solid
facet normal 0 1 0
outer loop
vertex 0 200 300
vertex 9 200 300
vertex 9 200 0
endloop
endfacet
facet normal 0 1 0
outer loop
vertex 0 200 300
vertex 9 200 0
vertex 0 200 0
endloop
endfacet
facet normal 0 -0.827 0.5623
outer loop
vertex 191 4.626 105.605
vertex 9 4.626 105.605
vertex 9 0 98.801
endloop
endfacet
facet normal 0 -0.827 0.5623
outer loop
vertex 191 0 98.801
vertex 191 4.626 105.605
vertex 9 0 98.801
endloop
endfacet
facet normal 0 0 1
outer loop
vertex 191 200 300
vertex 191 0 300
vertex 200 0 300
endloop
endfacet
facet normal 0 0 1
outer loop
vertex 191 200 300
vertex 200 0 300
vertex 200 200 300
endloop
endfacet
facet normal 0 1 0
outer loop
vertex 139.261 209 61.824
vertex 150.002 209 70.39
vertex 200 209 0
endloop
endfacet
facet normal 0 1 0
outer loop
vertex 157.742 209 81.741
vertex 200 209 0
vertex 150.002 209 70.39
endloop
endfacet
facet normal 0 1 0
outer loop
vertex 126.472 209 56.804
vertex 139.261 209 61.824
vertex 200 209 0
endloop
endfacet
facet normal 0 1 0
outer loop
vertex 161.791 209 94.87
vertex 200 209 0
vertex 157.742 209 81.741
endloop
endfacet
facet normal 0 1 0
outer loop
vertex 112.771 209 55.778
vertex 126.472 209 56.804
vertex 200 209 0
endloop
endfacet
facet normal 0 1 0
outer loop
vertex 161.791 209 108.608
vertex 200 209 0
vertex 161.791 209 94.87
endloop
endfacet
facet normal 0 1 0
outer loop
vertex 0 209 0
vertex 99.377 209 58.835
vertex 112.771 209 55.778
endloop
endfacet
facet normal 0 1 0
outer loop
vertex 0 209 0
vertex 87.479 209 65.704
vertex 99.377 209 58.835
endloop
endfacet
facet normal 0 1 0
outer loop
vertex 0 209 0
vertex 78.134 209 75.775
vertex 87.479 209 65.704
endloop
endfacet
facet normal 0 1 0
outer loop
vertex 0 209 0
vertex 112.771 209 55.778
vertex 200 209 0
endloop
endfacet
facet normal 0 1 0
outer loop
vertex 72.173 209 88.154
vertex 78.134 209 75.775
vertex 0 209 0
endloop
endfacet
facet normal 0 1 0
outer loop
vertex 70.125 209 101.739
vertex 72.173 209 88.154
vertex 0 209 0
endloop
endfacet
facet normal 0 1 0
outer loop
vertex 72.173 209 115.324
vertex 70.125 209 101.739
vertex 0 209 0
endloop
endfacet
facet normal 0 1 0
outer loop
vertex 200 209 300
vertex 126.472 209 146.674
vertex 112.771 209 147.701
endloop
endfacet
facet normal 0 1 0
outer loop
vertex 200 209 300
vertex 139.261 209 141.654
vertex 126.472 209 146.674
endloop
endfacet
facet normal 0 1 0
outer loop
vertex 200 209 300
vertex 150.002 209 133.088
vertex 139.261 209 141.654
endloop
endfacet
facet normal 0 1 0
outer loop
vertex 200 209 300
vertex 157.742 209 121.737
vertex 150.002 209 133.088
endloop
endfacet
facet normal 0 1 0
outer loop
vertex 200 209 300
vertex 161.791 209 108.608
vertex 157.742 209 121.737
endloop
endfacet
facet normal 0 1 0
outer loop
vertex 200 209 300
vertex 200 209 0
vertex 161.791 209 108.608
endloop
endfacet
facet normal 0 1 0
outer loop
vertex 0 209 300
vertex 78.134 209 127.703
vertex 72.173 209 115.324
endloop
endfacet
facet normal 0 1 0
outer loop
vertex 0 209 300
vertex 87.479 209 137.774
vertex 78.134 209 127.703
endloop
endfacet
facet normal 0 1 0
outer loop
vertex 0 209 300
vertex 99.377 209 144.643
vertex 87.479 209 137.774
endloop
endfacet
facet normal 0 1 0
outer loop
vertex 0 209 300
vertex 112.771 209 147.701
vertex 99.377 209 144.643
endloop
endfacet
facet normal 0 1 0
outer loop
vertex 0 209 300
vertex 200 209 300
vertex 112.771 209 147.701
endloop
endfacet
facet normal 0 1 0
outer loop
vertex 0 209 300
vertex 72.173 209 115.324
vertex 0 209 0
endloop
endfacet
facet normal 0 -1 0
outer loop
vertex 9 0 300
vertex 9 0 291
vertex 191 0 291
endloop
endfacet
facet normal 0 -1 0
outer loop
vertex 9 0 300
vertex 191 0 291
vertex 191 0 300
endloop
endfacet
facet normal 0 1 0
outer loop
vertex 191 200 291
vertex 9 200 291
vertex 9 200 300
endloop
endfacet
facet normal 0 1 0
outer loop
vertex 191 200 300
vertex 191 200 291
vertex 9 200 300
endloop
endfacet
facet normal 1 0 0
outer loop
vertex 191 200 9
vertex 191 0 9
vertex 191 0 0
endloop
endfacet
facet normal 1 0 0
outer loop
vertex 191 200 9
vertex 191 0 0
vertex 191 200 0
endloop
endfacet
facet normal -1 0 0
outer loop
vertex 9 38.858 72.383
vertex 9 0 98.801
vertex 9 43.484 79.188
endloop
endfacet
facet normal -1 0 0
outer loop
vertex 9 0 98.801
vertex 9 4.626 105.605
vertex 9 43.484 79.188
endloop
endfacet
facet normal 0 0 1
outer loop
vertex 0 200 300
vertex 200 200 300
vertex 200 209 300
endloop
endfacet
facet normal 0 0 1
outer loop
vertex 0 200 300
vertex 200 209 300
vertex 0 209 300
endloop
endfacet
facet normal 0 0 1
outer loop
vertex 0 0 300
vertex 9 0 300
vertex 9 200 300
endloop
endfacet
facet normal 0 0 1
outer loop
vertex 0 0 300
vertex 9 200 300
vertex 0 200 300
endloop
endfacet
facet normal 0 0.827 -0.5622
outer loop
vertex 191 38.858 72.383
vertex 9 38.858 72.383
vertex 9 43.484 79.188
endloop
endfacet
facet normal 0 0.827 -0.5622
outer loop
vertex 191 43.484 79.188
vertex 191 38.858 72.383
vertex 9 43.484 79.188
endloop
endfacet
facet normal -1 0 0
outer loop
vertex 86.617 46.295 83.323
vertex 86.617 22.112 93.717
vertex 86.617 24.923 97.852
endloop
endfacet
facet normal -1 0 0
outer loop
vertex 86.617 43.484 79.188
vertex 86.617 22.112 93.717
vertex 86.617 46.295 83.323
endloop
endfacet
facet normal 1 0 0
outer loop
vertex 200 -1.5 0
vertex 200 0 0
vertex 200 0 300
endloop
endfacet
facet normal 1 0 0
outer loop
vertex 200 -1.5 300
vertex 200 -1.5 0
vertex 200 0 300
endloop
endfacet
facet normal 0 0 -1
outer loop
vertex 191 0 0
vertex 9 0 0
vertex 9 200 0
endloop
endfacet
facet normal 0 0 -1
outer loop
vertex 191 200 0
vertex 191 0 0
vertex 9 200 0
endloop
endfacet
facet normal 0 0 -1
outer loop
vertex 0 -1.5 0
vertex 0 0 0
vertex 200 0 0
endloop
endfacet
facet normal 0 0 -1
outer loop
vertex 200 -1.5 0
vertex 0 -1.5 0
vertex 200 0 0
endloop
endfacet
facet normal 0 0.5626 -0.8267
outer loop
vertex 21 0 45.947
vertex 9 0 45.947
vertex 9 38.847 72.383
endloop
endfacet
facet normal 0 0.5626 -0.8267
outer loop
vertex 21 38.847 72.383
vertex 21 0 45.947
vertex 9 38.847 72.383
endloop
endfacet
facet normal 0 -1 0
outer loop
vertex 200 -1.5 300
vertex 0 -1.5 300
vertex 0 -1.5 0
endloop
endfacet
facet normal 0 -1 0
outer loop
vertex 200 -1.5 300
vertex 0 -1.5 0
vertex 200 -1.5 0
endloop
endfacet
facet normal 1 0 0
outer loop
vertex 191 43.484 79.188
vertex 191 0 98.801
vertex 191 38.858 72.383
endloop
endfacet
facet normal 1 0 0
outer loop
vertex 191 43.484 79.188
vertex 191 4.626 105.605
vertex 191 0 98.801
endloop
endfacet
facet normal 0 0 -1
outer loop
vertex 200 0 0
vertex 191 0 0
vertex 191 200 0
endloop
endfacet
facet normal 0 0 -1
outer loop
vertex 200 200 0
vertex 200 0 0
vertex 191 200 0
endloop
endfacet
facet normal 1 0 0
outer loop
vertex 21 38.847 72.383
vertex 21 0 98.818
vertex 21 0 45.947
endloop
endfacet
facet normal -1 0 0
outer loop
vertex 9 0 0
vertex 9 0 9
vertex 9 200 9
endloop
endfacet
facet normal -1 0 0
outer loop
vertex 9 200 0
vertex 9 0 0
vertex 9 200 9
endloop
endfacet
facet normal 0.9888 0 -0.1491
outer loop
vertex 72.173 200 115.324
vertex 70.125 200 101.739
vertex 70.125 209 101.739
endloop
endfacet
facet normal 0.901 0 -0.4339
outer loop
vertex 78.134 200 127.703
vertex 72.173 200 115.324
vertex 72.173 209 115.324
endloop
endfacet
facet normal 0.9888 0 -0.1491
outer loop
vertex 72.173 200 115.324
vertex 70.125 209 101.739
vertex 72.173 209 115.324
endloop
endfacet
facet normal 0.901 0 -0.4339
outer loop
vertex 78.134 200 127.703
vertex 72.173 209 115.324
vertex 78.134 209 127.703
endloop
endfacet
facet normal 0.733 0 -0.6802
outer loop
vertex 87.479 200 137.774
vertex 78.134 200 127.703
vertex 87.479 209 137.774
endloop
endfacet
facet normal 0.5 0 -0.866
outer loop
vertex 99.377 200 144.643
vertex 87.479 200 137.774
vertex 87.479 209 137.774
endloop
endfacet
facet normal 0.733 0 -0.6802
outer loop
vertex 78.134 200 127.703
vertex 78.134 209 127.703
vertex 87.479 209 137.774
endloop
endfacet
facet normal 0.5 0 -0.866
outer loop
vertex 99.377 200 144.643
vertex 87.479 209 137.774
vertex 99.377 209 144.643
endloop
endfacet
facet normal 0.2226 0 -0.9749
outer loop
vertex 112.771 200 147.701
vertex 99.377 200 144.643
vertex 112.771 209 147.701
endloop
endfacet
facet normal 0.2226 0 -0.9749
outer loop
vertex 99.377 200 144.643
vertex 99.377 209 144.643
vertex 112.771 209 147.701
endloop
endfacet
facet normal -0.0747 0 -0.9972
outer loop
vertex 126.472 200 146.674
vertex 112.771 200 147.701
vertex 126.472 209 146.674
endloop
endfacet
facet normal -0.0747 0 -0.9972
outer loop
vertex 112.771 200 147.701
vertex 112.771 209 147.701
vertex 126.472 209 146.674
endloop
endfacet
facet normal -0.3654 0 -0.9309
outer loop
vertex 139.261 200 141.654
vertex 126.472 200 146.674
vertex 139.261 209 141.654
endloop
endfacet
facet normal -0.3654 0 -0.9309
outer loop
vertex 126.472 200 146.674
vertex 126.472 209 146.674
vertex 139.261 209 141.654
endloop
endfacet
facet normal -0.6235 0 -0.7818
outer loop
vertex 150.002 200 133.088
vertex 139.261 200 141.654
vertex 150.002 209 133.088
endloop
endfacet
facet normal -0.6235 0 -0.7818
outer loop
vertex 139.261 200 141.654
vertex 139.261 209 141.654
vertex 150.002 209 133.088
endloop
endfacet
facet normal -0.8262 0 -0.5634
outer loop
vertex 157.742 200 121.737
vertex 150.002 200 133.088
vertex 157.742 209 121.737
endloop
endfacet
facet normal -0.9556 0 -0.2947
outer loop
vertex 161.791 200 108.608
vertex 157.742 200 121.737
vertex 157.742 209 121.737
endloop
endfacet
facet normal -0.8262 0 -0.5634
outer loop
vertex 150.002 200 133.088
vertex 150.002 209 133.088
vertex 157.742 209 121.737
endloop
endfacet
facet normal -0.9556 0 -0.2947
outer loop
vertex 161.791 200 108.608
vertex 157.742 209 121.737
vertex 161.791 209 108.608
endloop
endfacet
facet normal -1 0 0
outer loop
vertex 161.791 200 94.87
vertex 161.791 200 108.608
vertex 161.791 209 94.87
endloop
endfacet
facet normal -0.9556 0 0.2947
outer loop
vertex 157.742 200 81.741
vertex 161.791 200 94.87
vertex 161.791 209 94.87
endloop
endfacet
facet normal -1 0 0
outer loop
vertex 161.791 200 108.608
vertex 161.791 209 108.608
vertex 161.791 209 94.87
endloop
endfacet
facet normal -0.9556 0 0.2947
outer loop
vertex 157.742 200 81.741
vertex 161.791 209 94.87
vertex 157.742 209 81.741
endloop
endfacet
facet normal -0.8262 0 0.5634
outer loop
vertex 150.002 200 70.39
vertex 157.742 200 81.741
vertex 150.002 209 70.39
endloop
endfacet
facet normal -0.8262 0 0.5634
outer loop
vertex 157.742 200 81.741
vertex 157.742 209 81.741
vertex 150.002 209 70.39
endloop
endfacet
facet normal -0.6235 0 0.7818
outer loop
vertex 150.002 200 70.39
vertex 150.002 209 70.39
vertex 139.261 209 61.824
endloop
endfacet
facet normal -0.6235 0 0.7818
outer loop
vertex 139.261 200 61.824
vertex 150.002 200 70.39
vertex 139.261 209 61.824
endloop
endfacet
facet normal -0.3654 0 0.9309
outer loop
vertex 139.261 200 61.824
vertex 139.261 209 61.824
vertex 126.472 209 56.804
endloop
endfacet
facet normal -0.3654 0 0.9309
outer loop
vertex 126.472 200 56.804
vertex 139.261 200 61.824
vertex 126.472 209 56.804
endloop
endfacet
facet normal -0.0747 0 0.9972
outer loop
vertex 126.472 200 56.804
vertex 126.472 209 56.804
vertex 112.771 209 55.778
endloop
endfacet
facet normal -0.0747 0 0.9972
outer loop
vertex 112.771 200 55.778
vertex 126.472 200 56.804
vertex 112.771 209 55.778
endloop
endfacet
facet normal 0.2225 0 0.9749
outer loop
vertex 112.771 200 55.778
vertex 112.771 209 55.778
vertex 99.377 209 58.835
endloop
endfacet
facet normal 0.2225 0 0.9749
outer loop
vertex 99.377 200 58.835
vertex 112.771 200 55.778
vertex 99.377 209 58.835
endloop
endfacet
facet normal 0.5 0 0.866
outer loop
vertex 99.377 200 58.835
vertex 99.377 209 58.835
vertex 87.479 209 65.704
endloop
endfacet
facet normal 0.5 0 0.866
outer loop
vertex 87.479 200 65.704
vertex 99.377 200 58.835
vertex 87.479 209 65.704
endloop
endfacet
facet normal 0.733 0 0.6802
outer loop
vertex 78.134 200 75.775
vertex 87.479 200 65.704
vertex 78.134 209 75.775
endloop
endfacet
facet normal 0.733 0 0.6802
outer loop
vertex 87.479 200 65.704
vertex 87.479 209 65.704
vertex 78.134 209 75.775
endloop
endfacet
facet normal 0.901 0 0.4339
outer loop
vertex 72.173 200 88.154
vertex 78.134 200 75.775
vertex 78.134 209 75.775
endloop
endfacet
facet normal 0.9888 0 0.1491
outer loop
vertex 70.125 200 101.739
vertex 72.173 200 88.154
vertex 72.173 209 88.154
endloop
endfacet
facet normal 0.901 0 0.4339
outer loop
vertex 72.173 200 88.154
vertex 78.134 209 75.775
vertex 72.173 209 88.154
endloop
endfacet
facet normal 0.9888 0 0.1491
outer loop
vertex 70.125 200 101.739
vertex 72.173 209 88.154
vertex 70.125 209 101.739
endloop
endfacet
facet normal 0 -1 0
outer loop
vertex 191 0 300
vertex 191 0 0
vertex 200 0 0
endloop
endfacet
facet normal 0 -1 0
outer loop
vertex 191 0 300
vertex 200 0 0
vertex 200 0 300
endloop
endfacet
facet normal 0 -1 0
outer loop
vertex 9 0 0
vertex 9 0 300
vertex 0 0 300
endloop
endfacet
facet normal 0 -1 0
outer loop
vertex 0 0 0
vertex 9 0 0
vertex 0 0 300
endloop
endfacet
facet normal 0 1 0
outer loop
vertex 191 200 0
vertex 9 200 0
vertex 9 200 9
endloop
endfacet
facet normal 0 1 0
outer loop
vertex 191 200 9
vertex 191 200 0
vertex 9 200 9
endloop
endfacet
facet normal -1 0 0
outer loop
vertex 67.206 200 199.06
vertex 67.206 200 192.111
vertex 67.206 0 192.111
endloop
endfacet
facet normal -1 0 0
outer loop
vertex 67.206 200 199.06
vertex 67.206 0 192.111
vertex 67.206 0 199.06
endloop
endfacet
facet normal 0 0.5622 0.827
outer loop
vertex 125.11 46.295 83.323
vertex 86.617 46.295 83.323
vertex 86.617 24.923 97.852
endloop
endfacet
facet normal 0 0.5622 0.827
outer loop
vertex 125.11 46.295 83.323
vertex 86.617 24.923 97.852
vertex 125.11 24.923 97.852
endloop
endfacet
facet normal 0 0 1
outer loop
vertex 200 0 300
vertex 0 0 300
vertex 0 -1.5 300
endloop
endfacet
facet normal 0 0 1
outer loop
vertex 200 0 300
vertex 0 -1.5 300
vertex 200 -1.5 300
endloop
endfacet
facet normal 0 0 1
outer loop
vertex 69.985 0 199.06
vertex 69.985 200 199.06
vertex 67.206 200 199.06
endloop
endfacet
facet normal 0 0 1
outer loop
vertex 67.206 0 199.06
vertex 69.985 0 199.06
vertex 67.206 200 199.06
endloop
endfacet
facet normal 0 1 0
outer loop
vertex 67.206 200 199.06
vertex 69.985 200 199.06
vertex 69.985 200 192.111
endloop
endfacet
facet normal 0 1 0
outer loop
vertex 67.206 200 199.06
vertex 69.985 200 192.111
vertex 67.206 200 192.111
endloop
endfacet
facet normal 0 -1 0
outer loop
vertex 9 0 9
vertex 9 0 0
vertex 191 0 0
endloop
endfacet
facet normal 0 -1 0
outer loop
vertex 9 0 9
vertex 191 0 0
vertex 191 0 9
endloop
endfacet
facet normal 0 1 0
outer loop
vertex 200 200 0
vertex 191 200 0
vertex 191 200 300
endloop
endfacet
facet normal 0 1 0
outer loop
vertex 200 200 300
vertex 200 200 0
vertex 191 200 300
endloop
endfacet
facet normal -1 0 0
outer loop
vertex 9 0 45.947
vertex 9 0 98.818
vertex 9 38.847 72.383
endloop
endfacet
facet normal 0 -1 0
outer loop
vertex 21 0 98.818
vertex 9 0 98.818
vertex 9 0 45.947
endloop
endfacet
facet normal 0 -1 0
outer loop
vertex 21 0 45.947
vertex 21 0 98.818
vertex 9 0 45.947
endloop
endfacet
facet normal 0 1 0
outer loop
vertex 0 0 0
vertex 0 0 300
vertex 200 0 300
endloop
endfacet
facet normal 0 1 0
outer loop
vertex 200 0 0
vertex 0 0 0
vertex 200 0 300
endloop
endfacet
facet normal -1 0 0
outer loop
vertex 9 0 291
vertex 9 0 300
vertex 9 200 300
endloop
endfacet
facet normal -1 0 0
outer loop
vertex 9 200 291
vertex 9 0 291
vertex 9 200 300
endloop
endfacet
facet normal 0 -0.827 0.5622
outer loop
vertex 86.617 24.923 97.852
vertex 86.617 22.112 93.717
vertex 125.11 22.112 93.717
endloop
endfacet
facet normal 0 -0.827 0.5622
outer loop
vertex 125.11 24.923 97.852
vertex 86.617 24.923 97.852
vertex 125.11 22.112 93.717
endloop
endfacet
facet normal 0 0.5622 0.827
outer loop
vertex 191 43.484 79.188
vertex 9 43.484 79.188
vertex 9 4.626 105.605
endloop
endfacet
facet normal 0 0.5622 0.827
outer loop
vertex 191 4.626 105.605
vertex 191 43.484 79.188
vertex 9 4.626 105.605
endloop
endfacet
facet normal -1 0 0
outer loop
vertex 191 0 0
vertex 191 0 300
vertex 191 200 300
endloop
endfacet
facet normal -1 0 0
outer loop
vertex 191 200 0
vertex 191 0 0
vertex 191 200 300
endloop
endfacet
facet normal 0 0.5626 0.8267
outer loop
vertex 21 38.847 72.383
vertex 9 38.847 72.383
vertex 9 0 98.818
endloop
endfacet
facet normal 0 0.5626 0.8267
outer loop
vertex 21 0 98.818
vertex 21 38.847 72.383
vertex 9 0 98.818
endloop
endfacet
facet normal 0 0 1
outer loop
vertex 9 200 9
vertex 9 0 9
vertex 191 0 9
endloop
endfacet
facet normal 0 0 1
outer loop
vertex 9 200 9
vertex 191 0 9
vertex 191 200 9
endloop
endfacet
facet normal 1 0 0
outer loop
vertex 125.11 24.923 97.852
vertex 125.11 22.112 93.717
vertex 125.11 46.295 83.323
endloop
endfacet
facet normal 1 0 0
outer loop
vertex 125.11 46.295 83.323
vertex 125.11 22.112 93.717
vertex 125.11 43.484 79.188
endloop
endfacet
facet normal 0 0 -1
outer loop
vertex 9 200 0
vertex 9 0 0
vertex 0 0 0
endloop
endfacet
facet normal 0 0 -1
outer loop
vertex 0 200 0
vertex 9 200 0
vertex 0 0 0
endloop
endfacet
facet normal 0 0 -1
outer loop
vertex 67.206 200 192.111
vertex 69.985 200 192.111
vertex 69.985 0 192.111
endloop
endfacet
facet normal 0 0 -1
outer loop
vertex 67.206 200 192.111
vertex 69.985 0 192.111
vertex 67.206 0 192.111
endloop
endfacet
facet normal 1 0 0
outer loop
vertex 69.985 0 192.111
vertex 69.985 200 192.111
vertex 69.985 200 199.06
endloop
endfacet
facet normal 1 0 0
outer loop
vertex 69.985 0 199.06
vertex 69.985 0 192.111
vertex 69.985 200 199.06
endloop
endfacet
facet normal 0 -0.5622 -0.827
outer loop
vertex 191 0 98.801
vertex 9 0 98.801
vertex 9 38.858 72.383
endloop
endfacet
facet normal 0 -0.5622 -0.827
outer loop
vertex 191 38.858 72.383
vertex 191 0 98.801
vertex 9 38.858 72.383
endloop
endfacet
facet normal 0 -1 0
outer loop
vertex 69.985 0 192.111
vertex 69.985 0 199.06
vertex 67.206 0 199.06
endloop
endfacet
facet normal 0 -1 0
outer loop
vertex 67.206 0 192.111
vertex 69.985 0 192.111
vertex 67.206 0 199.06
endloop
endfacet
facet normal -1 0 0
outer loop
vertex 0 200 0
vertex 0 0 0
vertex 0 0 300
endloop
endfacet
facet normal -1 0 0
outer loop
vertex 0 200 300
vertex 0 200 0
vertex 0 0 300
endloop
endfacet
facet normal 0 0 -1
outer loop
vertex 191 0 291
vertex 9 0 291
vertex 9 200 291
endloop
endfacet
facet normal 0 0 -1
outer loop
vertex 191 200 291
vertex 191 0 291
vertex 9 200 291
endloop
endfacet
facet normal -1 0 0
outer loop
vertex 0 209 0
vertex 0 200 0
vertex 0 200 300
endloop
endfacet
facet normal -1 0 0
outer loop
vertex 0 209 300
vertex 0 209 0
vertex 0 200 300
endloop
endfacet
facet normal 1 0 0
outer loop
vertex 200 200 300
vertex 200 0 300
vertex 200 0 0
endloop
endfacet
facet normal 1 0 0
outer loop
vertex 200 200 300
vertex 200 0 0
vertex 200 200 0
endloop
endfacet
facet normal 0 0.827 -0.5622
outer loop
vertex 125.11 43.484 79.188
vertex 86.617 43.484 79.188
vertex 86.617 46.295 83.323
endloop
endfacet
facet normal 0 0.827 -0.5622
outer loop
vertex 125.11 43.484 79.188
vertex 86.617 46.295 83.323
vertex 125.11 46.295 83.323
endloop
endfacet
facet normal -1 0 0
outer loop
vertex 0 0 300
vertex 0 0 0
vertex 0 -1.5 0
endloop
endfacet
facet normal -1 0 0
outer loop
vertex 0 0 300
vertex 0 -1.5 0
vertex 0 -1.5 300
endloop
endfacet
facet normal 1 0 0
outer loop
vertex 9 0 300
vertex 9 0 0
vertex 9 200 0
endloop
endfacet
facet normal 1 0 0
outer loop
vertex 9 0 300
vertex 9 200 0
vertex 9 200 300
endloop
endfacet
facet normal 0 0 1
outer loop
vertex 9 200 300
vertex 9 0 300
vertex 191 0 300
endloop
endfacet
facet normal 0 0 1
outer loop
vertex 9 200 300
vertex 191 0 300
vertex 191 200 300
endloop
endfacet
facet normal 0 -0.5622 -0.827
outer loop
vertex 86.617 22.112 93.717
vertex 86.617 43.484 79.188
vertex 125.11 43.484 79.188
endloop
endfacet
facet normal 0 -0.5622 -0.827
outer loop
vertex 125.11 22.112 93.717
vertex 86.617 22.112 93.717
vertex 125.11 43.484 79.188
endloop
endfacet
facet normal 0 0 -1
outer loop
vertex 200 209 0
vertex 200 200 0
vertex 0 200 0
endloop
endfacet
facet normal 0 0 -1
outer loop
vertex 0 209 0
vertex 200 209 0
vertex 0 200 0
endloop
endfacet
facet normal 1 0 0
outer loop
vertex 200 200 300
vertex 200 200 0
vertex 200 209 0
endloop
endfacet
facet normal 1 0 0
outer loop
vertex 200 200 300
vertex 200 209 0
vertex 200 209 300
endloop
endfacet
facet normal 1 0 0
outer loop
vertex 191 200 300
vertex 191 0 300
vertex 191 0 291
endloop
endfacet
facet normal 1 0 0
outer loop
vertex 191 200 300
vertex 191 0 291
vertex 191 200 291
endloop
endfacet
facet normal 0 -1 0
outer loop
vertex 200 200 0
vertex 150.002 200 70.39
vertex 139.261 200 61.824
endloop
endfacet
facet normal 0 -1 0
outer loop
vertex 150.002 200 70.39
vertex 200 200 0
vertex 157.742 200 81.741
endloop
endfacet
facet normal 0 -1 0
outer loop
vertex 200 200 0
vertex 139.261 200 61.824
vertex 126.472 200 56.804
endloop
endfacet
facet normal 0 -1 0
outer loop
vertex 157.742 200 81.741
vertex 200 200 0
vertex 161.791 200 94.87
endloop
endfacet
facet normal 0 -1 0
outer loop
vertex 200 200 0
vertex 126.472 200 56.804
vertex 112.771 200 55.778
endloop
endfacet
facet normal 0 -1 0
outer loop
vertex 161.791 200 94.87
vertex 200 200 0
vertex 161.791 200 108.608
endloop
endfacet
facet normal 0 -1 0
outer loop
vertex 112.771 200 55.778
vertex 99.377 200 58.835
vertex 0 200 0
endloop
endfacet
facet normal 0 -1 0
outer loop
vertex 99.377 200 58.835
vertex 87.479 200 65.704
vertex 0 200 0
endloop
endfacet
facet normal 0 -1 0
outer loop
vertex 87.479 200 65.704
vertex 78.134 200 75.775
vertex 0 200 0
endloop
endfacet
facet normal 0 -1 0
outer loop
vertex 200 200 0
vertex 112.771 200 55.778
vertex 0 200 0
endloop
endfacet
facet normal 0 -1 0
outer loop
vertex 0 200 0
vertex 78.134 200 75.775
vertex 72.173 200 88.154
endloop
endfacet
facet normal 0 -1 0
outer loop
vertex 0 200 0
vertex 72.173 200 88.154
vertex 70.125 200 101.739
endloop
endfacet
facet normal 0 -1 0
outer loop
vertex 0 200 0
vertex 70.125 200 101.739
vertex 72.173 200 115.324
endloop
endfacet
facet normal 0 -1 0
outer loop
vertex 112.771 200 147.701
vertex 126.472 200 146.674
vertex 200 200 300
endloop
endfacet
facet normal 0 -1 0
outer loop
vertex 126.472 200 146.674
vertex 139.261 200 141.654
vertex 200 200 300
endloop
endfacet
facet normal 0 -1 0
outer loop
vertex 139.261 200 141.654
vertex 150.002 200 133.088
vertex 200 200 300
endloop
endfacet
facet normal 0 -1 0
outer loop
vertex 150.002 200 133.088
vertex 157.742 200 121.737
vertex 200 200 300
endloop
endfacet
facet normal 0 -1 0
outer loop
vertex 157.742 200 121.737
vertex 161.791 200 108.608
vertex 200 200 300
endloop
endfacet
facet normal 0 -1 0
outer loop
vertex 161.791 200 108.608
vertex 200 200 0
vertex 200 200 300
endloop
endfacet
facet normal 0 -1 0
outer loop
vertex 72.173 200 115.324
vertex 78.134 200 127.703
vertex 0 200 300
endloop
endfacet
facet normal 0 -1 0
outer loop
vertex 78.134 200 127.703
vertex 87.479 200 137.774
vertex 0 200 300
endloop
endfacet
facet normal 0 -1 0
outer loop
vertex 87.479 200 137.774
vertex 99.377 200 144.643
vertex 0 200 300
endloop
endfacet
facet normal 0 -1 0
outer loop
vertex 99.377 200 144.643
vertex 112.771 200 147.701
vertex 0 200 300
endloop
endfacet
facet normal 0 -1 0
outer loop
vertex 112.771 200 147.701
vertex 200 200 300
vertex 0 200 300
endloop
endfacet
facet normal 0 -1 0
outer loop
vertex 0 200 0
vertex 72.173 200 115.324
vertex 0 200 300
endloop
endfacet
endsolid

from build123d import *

# Parameters (mm, degrees)
F0_W      = 200
F0_H      = 300
F1_DEPTH  = 1.5
F2_W      = 9
F2_H      = 300
F3_DEPTH  = 200
F2_W_2    = 2.7795433998
F2_H_2    = 6.9488584995
F5_DEPTH  = 12
F7_DEPTH  = 182
F8_W      = 38.4938195348
F8_H      = 25.8426551498
F9_DEPTH  = 5
F10_W     = 200
F10_H     = 9
F11_DEPTH = 182
F12_W     = 200
F12_H     = 9
F13_DEPTH = 182
F14_W     = 200
F14_H     = 300
F15_DEPTH = 9
F16_W     = 200
F16_H     = 300
F17_DEPTH = 9
F18_R     = 46.0903835616
F19_DEPTH = 9


with BuildPart() as f1:
    # F0 (on Front) → F1 (new body)
    with BuildSketch(Plane.XZ):
        with Locations((100, 150)):
            Rectangle(F0_W, F0_H)
    extrude(amount=F1_DEPTH)


with BuildPart() as f3:
    # F2 (on face) → F3 (new body)
    with BuildSketch(Plane(origin=(0, 0, 0), x_dir=(-1, 0, 0), z_dir=(0, 1, 0))):
        with Locations((-4.5, 150)):
            Rectangle(F2_W, F2_H)
    extrude(amount=F3_DEPTH)


with BuildPart() as f3b:
    # F2 (on face) → F3, piece 2 (new body)
    with BuildSketch(Plane(origin=(0, 0, 0), x_dir=(-1, 0, 0), z_dir=(0, 1, 0))):
        with Locations((-68.5956031084, 195.5856233835)):
            Rectangle(F2_W_2, F2_H_2)
    extrude(amount=F3_DEPTH)


with BuildPart() as f5:
    # F4 (on face) → F5 (new body)
    with BuildSketch(Plane.YZ.offset(9)):
        Polygon((38.8471707702, 72.3829492927), (0, 98.8184660673), (0, 45.9474399686), align=None)
    extrude(amount=F5_DEPTH)


with BuildPart() as f7:
    # F6 (on face) → F7 (new body)
    with BuildSketch(Plane.YZ.offset(9)):
        Polygon((0, 98.8005093836), (38.8582931021, 72.3834415504), (43.4840800956, 79.1877616951), (4.6257869935, 105.6048295283), align=None)
    extrude(amount=F7_DEPTH)


with BuildPart() as f9:
    # F8 (on face) → F9 (new body)
    with BuildSketch(Plane(origin=(0, 50.5627411744, 74.3754692613), x_dir=(1, 0, 0), z_dir=(0, 0.5622143833, 0.8269915279))):
        with Locations((105.8635227382, -21.4808603388)):
            Rectangle(F8_W, F8_H)
    extrude(amount=F9_DEPTH)


with BuildPart() as f11:
    # F10 (on face) → F11 (new body)
    with BuildSketch(Plane.YZ.offset(9)):
        with Locations((100, 295.5)):
            Rectangle(F10_W, F10_H)
    extrude(amount=F11_DEPTH)


with BuildPart() as f13:
    # F12 (on face) → F13 (new body)
    with BuildSketch(Plane.YZ.offset(9)):
        with Locations((100, 4.5)):
            Rectangle(F12_W, F12_H)
    extrude(amount=F13_DEPTH)


with BuildPart() as f15:
    # F14 (on face) → F15 (new body)
    with BuildSketch(Plane.YZ.offset(191)):
        with Locations((100, 150)):
            Rectangle(F14_W, F14_H)
    extrude(amount=F15_DEPTH)


with BuildPart() as f17:
    # F16 (on face) → F17 (new body)
    with BuildSketch(Plane(origin=(0, 200, 0), x_dir=(-1, 0, 0), z_dir=(0, 1, 0))):
        with Locations((-100, 150)):
            Rectangle(F16_W, F16_H)
    extrude(amount=F17_DEPTH)

    # F18 (on face) → F19 (cut)
    with BuildSketch(Plane(origin=(0, 209, 0), x_dir=(-1, 0, 0), z_dir=(0, 1, 0))):
        with Locations((-116.2157654762, 101.7390489578)):
            Circle(F18_R)
    extrude(amount=-F19_DEPTH, mode=Mode.SUBTRACT)


solid = Compound([f1.part, f3.part, f3b.part, f5.part, f7.part, f9.part, f11.part, f13.part, f15.part, f17.part])
